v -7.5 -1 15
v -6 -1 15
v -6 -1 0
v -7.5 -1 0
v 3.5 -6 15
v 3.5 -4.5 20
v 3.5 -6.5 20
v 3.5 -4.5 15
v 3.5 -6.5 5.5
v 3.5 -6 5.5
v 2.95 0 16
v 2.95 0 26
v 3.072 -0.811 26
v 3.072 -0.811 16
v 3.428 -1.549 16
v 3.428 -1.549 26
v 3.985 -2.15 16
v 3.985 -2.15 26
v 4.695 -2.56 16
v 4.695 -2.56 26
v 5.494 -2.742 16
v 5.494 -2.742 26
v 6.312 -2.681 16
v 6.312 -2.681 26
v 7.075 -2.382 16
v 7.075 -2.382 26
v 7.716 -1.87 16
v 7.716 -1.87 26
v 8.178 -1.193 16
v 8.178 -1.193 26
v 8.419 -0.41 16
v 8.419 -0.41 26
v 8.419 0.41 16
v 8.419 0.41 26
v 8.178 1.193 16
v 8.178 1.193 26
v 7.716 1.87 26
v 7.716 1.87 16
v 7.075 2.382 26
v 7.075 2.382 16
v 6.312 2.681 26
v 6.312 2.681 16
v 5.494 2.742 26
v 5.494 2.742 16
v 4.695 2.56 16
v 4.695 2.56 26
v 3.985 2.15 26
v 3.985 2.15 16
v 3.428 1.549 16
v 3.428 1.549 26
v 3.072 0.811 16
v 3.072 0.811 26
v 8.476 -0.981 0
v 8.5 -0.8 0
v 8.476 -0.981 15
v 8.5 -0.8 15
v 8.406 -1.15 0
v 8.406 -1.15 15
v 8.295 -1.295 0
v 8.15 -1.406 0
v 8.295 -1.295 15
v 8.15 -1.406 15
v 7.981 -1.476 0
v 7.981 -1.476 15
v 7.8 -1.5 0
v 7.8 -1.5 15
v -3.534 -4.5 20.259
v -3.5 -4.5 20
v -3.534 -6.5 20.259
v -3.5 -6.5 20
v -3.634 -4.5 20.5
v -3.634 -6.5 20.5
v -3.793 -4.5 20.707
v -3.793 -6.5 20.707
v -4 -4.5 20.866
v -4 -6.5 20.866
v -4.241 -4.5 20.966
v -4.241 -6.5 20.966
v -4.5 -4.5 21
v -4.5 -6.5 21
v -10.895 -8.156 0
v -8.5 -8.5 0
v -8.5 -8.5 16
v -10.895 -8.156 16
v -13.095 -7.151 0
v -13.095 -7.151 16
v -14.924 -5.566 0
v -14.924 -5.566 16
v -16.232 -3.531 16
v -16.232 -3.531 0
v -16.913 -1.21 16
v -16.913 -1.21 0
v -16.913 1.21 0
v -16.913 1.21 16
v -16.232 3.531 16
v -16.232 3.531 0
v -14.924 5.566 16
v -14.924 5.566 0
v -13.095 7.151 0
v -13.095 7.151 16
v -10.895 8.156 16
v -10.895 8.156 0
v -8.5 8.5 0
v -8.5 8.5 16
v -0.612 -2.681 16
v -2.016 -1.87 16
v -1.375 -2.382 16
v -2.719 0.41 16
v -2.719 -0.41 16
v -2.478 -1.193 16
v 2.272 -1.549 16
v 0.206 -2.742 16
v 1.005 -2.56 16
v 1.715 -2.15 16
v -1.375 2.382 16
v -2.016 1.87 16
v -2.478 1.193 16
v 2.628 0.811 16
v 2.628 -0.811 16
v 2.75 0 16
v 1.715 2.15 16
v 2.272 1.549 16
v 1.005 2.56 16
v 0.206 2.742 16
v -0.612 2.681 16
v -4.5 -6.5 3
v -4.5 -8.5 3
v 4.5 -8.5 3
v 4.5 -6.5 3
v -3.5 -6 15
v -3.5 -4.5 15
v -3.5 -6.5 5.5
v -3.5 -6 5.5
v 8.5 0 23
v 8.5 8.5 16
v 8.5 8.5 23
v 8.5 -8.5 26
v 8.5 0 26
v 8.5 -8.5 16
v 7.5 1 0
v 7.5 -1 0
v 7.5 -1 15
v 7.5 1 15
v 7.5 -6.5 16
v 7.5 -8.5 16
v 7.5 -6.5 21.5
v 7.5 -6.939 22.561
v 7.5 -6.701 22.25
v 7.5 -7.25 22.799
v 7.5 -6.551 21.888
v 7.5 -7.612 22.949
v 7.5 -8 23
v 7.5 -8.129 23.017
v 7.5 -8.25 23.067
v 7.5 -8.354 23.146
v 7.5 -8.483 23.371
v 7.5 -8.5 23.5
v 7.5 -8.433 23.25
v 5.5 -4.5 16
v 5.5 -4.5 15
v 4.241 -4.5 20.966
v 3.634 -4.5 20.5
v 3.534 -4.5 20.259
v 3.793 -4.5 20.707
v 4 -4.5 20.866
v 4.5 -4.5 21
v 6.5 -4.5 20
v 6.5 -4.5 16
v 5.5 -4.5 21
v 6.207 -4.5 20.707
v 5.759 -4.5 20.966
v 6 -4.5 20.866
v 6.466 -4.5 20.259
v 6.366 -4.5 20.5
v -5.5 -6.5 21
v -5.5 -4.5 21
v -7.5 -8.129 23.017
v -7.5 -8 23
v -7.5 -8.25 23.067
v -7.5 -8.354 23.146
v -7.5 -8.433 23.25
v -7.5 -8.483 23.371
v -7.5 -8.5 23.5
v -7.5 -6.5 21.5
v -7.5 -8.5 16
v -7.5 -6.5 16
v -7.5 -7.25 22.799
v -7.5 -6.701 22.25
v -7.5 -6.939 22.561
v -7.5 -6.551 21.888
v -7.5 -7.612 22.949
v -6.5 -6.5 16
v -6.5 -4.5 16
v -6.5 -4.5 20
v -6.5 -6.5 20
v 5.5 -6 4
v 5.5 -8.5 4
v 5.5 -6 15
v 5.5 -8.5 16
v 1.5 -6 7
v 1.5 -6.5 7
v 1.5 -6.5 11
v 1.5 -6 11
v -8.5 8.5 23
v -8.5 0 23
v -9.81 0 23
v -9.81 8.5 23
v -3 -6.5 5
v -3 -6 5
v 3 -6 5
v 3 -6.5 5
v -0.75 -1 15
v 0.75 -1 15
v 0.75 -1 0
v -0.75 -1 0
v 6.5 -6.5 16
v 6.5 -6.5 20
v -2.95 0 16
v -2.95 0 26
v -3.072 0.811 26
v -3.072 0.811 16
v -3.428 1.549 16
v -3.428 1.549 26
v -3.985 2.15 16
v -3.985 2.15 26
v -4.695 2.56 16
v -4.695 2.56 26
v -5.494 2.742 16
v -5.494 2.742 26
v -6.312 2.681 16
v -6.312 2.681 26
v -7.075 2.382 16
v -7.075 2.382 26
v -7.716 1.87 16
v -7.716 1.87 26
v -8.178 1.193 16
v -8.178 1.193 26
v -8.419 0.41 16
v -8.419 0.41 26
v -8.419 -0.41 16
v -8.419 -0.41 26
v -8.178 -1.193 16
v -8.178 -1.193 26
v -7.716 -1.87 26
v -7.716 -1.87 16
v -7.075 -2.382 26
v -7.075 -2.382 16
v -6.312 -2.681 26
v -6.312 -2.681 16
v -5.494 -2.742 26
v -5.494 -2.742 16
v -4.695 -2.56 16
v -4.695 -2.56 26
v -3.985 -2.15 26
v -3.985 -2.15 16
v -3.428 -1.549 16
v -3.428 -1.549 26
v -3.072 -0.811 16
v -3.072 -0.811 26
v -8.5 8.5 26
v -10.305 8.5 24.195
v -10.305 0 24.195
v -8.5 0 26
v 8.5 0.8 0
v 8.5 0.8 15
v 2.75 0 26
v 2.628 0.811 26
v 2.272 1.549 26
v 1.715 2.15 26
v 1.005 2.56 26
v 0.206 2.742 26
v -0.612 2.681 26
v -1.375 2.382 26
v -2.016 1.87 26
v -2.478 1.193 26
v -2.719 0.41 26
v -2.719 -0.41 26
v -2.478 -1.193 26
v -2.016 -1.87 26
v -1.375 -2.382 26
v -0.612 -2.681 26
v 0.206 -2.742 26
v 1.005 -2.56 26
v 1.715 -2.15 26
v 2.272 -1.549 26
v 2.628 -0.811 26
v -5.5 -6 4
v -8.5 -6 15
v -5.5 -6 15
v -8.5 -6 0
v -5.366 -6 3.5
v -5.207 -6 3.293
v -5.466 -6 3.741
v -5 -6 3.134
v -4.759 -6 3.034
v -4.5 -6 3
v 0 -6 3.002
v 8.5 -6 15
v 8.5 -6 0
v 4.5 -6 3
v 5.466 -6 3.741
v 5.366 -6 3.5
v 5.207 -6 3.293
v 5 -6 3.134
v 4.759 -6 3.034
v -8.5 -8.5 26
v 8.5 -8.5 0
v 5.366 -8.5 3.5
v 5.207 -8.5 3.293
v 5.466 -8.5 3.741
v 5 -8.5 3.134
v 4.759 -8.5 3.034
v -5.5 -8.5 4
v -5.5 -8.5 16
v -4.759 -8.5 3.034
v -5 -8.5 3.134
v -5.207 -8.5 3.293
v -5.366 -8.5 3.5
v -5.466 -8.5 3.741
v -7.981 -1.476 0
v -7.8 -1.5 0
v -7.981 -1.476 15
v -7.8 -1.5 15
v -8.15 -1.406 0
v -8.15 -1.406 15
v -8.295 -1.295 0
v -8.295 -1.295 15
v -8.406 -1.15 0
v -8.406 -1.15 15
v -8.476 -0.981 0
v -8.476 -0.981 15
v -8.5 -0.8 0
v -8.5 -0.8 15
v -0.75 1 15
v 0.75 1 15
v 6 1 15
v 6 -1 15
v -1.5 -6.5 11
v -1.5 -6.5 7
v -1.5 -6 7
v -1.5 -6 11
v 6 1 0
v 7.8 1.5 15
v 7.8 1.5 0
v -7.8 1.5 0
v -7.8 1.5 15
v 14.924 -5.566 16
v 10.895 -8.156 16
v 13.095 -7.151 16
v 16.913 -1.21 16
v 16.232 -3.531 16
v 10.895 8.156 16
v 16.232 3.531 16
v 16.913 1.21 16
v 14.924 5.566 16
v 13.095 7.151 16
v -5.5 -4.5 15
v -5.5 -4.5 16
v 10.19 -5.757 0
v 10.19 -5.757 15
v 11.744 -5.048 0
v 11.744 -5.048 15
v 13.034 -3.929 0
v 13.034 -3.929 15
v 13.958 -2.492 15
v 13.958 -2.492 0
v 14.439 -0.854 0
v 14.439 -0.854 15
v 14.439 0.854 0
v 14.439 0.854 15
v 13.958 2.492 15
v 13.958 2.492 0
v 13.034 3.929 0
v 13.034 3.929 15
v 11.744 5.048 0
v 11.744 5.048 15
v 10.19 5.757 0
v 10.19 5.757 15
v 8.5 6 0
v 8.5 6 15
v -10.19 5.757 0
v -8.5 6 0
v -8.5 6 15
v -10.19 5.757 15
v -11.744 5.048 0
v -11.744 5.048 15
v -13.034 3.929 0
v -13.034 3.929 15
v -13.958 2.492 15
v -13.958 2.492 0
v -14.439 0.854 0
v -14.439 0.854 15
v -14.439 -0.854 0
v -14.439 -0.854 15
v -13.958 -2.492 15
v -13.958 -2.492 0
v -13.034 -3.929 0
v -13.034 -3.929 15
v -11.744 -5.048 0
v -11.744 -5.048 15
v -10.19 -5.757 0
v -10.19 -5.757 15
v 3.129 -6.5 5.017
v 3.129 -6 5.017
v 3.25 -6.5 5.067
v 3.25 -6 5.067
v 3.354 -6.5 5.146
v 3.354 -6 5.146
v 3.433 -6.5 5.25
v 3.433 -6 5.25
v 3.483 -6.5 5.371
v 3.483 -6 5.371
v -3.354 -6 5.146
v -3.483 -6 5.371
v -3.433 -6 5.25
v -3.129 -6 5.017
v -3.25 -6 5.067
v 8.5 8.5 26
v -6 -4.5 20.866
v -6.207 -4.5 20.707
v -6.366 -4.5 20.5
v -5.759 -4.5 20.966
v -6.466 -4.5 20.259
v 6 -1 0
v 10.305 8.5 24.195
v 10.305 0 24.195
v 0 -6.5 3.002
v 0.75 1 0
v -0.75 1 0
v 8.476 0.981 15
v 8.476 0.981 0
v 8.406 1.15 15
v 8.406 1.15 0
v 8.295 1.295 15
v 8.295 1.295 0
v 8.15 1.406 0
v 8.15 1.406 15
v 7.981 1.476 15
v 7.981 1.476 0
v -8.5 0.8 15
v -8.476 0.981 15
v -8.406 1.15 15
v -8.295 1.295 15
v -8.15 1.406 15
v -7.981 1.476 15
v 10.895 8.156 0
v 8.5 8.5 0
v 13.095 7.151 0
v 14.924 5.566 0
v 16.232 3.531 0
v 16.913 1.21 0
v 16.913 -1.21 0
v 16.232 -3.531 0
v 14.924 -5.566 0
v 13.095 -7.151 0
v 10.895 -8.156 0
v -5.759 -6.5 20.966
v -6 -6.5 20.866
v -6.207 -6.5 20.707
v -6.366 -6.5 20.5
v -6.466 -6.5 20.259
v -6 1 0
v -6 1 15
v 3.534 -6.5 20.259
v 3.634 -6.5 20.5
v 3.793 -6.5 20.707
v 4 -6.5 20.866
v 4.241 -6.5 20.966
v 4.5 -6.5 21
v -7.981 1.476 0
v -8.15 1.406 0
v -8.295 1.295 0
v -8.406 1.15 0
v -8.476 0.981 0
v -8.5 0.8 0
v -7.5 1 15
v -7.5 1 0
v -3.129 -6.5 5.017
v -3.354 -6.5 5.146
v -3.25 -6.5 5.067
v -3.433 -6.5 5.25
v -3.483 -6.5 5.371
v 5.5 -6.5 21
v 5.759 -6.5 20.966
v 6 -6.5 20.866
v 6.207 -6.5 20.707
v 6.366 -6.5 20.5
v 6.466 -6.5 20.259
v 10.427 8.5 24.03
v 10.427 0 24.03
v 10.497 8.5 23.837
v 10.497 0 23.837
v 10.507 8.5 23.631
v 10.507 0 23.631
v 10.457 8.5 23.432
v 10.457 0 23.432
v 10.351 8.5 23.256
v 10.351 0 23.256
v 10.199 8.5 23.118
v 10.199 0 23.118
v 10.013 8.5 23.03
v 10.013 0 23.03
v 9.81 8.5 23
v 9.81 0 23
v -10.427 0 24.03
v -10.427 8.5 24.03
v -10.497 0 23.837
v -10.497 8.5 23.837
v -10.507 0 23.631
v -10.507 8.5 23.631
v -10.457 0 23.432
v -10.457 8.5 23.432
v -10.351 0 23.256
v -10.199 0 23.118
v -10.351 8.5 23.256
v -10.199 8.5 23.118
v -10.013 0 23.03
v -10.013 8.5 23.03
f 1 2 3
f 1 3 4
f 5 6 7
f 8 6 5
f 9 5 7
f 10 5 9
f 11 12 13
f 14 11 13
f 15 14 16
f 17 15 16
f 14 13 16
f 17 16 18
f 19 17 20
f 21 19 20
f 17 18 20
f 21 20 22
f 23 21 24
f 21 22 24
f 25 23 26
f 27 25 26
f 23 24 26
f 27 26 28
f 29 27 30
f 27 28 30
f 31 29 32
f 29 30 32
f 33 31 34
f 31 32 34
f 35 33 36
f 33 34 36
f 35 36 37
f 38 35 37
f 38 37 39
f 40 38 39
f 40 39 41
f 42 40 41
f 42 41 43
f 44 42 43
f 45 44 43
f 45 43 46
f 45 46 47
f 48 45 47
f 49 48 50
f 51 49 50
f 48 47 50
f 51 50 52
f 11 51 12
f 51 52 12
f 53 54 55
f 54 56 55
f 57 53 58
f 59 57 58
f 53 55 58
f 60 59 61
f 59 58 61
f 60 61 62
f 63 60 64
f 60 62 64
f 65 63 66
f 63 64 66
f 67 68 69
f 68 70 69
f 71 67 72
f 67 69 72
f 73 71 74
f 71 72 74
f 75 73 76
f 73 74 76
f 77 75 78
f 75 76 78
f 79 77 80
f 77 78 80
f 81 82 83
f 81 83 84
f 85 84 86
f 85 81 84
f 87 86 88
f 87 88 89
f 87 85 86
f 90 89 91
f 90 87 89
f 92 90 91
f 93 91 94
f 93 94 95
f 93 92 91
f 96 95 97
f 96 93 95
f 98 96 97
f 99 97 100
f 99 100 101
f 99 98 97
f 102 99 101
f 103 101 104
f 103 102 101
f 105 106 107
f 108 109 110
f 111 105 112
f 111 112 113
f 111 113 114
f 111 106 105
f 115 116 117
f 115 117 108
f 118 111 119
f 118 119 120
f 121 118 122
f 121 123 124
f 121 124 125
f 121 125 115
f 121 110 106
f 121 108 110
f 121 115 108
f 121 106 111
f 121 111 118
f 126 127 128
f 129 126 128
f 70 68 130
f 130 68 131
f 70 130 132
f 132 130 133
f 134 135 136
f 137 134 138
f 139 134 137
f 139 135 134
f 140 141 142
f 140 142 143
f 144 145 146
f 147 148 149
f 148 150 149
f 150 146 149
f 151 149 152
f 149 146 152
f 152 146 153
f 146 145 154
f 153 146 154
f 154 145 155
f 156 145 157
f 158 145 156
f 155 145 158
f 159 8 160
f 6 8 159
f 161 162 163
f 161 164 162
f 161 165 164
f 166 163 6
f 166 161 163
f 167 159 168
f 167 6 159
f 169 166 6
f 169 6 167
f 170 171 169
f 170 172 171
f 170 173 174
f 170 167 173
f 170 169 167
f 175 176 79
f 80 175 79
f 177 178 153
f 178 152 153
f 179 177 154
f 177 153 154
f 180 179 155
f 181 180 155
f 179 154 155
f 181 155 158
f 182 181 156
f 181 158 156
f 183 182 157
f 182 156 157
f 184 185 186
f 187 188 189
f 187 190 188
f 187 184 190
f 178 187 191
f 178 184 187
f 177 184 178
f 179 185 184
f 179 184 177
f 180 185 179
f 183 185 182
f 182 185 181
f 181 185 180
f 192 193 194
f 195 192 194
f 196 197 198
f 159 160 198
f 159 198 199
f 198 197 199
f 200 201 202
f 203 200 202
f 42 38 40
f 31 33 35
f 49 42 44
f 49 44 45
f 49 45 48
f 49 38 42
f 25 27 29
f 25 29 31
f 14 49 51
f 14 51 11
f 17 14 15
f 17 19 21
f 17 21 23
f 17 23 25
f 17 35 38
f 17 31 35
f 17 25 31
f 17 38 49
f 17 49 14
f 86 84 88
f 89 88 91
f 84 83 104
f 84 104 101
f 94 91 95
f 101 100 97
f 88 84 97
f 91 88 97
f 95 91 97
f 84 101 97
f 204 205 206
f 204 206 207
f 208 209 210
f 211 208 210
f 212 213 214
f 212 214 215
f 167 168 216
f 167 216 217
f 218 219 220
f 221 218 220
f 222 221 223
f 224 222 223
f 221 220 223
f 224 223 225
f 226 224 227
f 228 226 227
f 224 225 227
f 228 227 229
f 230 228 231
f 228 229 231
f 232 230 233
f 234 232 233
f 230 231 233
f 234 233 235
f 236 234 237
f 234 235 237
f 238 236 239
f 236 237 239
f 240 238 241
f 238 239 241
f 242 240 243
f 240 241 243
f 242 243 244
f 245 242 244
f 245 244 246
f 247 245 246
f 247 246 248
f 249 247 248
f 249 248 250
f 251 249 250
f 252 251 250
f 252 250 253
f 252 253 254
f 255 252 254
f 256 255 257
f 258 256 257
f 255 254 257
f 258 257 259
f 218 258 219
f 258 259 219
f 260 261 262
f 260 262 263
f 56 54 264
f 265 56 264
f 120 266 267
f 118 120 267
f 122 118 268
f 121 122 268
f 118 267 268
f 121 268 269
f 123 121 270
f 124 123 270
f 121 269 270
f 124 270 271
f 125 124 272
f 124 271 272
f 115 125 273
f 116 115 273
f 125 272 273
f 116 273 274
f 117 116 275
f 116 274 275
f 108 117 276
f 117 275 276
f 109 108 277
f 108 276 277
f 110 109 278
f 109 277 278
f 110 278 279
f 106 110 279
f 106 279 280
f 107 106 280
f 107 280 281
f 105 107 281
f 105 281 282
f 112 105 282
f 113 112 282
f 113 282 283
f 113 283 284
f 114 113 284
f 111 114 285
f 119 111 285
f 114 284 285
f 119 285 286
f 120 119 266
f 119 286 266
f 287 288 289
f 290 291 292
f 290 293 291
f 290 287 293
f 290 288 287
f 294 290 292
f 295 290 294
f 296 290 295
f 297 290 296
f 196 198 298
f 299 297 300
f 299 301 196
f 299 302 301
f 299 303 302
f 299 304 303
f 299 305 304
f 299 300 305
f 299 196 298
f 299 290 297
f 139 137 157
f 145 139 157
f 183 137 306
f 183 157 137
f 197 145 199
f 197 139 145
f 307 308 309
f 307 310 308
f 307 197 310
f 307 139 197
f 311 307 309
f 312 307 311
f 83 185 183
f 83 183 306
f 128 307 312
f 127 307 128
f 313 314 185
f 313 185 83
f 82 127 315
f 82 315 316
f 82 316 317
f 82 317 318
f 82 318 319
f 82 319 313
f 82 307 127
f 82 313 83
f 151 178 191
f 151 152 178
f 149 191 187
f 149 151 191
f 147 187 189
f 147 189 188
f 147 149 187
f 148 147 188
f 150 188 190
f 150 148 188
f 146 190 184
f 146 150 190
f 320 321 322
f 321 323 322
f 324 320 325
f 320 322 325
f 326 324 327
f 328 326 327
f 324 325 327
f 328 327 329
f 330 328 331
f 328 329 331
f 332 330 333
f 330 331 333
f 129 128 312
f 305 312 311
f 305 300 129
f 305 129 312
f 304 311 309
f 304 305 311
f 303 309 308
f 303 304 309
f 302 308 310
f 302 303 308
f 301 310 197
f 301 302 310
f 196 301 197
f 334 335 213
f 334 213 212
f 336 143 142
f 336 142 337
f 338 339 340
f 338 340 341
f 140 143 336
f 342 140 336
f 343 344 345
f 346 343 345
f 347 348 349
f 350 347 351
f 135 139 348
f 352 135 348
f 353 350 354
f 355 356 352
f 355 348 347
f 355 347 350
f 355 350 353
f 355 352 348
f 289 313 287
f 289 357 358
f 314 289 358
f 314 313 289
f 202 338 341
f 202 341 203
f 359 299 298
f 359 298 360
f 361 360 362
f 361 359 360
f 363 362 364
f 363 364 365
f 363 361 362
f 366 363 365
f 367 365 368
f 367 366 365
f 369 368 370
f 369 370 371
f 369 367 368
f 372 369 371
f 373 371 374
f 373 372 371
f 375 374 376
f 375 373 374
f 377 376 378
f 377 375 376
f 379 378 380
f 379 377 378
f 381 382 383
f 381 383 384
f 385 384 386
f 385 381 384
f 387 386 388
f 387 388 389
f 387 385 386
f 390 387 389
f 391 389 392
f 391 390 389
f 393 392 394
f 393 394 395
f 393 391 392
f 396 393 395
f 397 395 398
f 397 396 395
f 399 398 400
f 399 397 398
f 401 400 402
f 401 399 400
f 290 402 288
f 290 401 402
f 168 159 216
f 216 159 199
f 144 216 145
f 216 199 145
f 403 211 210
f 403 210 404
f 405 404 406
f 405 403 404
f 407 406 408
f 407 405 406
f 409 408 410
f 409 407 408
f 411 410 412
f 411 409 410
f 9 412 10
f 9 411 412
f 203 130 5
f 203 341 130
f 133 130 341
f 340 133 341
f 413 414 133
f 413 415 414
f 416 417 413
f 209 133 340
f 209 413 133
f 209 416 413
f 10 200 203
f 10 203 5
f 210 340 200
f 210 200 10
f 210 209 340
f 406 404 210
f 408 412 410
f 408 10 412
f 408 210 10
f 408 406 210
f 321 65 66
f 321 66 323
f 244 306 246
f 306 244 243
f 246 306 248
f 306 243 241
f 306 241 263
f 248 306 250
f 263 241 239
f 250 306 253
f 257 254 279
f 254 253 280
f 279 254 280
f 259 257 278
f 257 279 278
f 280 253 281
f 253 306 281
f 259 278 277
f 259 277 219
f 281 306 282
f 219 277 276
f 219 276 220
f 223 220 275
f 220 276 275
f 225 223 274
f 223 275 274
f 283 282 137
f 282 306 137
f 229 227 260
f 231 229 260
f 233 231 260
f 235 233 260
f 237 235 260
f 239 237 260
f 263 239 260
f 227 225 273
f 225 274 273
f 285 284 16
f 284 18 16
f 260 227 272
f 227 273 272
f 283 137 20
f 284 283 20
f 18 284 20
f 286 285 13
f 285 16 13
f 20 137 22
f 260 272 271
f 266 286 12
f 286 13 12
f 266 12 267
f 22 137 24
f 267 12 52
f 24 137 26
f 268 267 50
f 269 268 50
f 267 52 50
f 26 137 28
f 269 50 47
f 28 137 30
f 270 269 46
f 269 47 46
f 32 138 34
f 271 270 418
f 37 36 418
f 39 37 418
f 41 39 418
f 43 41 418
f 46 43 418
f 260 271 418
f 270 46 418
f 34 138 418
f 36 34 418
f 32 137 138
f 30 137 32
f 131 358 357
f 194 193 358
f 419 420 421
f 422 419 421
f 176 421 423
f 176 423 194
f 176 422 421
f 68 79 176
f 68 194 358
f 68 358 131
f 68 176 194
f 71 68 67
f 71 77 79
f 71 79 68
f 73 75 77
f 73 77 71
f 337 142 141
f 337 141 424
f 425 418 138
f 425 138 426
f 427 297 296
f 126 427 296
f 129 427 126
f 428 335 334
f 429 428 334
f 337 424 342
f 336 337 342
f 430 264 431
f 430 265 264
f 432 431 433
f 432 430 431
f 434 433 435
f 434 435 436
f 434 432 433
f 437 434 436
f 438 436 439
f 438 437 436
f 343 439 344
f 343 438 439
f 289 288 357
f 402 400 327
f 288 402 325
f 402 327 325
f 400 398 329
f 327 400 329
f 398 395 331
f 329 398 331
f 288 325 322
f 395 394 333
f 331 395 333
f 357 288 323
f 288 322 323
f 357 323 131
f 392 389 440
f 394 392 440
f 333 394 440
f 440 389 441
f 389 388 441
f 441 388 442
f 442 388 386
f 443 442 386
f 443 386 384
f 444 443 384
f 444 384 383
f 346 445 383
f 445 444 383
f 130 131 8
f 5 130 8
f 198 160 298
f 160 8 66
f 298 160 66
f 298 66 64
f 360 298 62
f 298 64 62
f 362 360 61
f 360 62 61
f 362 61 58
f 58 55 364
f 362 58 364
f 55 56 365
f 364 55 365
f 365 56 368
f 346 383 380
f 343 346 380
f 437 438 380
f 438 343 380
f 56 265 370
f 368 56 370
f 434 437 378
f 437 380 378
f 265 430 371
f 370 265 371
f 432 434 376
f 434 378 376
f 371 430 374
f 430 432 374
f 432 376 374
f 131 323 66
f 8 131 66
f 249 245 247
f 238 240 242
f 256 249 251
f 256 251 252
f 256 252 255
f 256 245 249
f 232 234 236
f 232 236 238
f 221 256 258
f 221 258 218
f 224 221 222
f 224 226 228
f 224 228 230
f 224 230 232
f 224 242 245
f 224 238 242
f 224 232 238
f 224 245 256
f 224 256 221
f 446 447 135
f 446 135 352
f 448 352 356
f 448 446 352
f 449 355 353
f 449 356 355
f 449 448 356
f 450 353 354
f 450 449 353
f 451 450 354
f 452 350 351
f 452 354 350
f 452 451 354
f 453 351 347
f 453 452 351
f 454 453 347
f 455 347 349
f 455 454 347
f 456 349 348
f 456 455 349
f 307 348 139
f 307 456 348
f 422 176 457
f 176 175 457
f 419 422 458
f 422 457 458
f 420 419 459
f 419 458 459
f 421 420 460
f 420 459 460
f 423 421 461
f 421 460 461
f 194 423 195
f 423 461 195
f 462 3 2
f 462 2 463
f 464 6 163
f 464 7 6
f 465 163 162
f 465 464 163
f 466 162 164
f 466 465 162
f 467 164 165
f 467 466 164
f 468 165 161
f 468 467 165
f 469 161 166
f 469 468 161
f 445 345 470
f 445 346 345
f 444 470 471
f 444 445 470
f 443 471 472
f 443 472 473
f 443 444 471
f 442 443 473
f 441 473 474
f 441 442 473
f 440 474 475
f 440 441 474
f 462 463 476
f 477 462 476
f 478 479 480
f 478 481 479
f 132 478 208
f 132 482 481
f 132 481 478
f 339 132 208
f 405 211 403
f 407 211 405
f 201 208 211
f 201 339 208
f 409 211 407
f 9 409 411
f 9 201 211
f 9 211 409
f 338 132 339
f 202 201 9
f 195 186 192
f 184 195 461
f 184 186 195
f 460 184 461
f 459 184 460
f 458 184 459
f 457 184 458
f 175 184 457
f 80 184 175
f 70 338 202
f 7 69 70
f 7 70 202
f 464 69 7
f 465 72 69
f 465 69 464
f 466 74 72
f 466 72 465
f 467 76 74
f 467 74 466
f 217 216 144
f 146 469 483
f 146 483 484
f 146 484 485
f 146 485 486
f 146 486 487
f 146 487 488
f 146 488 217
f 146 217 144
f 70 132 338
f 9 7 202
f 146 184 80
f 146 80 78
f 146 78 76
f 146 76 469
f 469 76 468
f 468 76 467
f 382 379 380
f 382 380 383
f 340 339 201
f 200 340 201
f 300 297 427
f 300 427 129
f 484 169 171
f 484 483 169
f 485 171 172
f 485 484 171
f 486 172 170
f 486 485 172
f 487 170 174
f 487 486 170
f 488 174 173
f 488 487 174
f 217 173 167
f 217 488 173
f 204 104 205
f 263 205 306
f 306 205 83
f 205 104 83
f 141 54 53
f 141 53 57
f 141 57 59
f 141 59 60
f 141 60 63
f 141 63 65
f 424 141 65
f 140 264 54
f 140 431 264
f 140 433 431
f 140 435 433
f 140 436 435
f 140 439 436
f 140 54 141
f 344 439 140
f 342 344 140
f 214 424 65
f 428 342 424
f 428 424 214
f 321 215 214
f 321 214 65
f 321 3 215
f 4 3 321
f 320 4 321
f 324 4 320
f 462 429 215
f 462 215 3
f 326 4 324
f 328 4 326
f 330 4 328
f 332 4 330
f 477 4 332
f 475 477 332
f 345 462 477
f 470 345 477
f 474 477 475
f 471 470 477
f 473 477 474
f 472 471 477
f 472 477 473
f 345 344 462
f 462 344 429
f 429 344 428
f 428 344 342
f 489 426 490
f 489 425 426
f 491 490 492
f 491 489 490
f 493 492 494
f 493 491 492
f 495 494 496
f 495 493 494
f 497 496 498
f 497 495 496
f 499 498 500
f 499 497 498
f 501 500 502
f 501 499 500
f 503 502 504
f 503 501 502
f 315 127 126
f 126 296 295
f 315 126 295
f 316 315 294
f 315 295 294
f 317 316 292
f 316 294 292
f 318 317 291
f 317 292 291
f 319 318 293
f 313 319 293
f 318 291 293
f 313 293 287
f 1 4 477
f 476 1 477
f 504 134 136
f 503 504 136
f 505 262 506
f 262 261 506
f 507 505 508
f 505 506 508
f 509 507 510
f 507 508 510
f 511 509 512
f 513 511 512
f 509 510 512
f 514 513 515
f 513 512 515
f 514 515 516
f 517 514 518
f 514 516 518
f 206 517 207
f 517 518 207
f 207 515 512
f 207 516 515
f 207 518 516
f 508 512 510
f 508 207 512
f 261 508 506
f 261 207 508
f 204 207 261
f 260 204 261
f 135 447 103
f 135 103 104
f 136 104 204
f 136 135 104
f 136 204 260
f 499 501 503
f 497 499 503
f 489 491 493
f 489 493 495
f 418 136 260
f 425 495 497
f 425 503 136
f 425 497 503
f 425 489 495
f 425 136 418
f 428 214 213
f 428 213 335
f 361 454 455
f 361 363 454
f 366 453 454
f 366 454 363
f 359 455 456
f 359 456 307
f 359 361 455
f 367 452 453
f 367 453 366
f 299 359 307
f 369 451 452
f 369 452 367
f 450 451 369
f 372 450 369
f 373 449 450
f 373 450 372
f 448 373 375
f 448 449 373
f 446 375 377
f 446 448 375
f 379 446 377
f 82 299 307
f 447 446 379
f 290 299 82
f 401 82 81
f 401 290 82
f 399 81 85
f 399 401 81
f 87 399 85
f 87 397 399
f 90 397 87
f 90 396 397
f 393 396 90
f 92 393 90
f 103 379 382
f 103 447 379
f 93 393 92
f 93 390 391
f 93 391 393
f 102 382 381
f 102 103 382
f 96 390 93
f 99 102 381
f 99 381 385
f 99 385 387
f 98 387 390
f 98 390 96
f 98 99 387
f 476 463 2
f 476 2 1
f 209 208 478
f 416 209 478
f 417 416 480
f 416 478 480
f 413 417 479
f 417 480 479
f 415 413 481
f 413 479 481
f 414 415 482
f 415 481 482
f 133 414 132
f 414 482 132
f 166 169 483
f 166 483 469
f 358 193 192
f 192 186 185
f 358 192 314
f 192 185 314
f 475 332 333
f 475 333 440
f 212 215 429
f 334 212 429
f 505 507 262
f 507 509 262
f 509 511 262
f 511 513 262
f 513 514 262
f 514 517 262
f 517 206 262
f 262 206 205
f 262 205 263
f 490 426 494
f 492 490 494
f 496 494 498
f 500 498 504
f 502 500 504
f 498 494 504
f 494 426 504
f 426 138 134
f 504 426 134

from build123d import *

# Parameters (mm, degrees)
EXTRUDE_1_DEPTH      = 26
CUT_EXTRUDE_START    = -10
CUT_EXTRUDE_1_DEPTH  = 10
SKETCH_3_W           = 3
SKETCH_3_H           = 8.5
EXTRUDE_2_DEPTH      = 3
CUT_EXTRUDE_2_REACH  = 37.412
SKETCH_5_W           = 3
SKETCH_5_H           = 8.5
EXTRUDE_3_DEPTH      = 3
CUT_EXTRUDE_3_REACH  = 37.412
SKETCH_7_W           = 11
SKETCH_7_H           = 20
CUT_EXTRUDE_4_DEPTH  = 2
FILLET_3_R           = 1
FILLET_4_R           = 1
SKETCH_10_W          = 15
SKETCH_10_H          = 7
CUT_EXTRUDE_5_DEPTH  = 2
CUT_EXTRUDE_START_2  = -4
CUT_EXTRUDE_6_DEPTH  = 4
FILLET_5_R           = 0.5
FILLET_6_R           = 0.5
FILLET_7_R           = 1
FILLET_9_R           = 0.7
FILLET_10_R          = 0.7
SKETCH_12_W          = 3
SKETCH_12_H          = 4
CUT_EXTRUDE_7_DEPTH  = 4
FILLET_11_R          = 1.5
FILLET_12_R          = 0.5
SKETCH_13_R          = 2.75
CUT_EXTRUDE_16_DEPTH = 10
SKETCH_14_W          = 17
SKETCH_14_H          = 3
CUT_EXTRUDE_20_DEPTH = 15
FILLET_13_R          = 0.7
SKETCH_15_W          = 1.5
SKETCH_15_H          = 2
CUT_EXTRUDE_22_DEPTH = 15


with BuildPart() as part:
    # ｽｹｯﾁ1 → ﾎﾞｽ - 押し出し1 (new body)
    with BuildSketch(Plane.XY):
        with BuildLine():
            Line((8.5, -8.5), (-8.5, -8.5))
            ThreePointArc((-8.5, -8.5), (-17, 0), (-8.5, 8.5))
            Line((-8.5, 8.5), (8.5, 8.5))
            ThreePointArc((8.5, 8.5), (17, 0), (8.5, -8.5))
        make_face()
    extrude(amount=EXTRUDE_1_DEPTH)

    # ｽｹｯﾁ2 → ｶｯﾄ - 押し出し1 (cut)
    with BuildSketch(Plane.XY.offset(26).offset(CUT_EXTRUDE_START)):
        with BuildLine():
            Line((-8.5, 8.5), (-8.5, -8.5))
            ThreePointArc((-8.5, -8.5), (-17, 0), (-8.5, 8.5))
        make_face()
        with BuildLine():
            Line((8.5, 8.5), (8.5, -8.5))
            ThreePointArc((8.5, -8.5), (17, 0), (8.5, 8.5))
        make_face()
    extrude(amount=CUT_EXTRUDE_1_DEPTH, mode=Mode.SUBTRACT)

    # ｽｹｯﾁ3 → ﾎﾞｽ - 押し出し2 (add)
    with BuildSketch(Plane(origin=(8.5, 0, 0), x_dir=(0, 0, -1), z_dir=(1, 0, 0))):
        with Locations((-24.5, 4.25)):
            Rectangle(SKETCH_3_W, SKETCH_3_H)
    extrude(amount=EXTRUDE_2_DEPTH)

    # ｽｹｯﾁ4 → ｶｯﾄ - 押し出し2 (cut, up to next)
    with BuildSketch(Plane(origin=(0, 8.5, 0), x_dir=(1, 0, 0), z_dir=(0, 1, 0)), mode=Mode.PRIVATE) as cut_extrude_2_sk1:
        Polygon((11.5, -23), (11.5, -26), (8.5, -26), align=None)
    cut_extrude_2_tool1 = extrude(cut_extrude_2_sk1.sketch, amount=-CUT_EXTRUDE_2_REACH, mode=Mode.PRIVATE) & part.part
    add(cut_extrude_2_tool1.solids().sort_by_distance((10.5, 8.5, 25))[0], mode=Mode.SUBTRACT)

    # ｽｹｯﾁ5 → ﾎﾞｽ - 押し出し3 (add)
    with BuildSketch(Plane.ZY.offset(8.5)):
        with Locations((24.5, 4.25)):
            Rectangle(SKETCH_5_W, SKETCH_5_H)
    extrude(amount=EXTRUDE_3_DEPTH)

    # ｽｹｯﾁ6 → ｶｯﾄ - 押し出し3 (cut, up to next)
    with BuildSketch(Plane(origin=(0, 8.5, 0), x_dir=(1, 0, 0), z_dir=(0, 1, 0)), mode=Mode.PRIVATE) as cut_extrude_3_sk1:
        Polygon((-11.5, -26), (-11.5, -23), (-8.5, -26), align=None)
    cut_extrude_3_tool1 = extrude(cut_extrude_3_sk1.sketch, amount=-CUT_EXTRUDE_3_REACH, mode=Mode.PRIVATE) & part.part
    add(cut_extrude_3_tool1.solids().sort_by_distance((-10.5, 8.5, 25))[0], mode=Mode.SUBTRACT)

    # ｽｹｯﾁ7 → ｶｯﾄ - 押し出し4 (cut)
    with BuildSketch(Plane.XZ.offset(8.5)):
        with Locations((0, 13)):
            Rectangle(SKETCH_7_W, SKETCH_7_H)
    extrude(amount=-CUT_EXTRUDE_4_DEPTH, mode=Mode.SUBTRACT)

    # ﾌｨﾚｯﾄ3
    fillet_3_edges = [part.edges().sort_by_distance(p)[0] for p in [
        (5.5, -7.5, 3),
    ]]
    fillet(fillet_3_edges, radius=FILLET_3_R)

    # ﾌｨﾚｯﾄ4
    fillet_4_edges = [part.edges().sort_by_distance(p)[0] for p in [
        (-5.5, -7.5, 3),
    ]]
    fillet(fillet_4_edges, radius=FILLET_4_R)

    # ｽｹｯﾁ10 → ｶｯﾄ - 押し出し5 (cut)
    with BuildSketch(Plane.XZ.offset(8.5)):
        with Locations((0, 19.5)):
            Rectangle(SKETCH_10_W, SKETCH_10_H)
    extrude(amount=-CUT_EXTRUDE_5_DEPTH, mode=Mode.SUBTRACT)

    # ｽｹｯﾁ11 → ｶｯﾄ - 押し出し6 (cut)
    with BuildSketch(Plane.XZ.offset(8.5).offset(CUT_EXTRUDE_START_2)):
        with BuildLine():
            Line((6.5, 21), (3.5, 21))
            Line((3.5, 21), (3.5, 5))
            Line((3.5, 5), (0, 5))
            Line((0, 5), (0, 3.001563835))
            Line((0, 3.001563835), (4.5, 3))
            ThreePointArc((4.5, 3), (5.207106781, 3.292893219), (5.5, 4))
            Line((5.5, 4), (5.5, 16))
            Line((5.5, 16), (6.5, 16))
            Line((6.5, 16), (6.5, 21))
        make_face()
    cut_extrude_6 = extrude(amount=CUT_EXTRUDE_6_DEPTH, mode=Mode.SUBTRACT)

    # ﾐﾗｰ1: ｶｯﾄ - 押し出し6 across plane
    add(cut_extrude_6.mirror(Plane(origin=(0, 0, 0), x_dir=(0, 0, 1), z_dir=(1, 0, 0))), mode=Mode.SUBTRACT)

    # ﾌｨﾚｯﾄ5
    fillet_5_edges = [part.edges().sort_by_distance(p)[0] for p in [
        (3.5, -5.5, 5),
    ]]
    fillet(fillet_5_edges, radius=FILLET_5_R)

    # ﾌｨﾚｯﾄ6
    fillet_6_edges = [part.edges().sort_by_distance(p)[0] for p in [
        (-3.5, -5.5, 5),
    ]]
    fillet(fillet_6_edges, radius=FILLET_6_R)

    # ﾌｨﾚｯﾄ7
    fillet_7_edges = [part.edges().sort_by_distance(p)[0] for p in [
        (3.5, -5.5, 21),
        (6.5, -5.5, 21),
        (-6.5, -5.5, 21),
        (-3.5, -5.5, 21),
    ]]
    fillet(fillet_7_edges, radius=FILLET_7_R)

    # ﾌｨﾚｯﾄ9
    fillet_9_edges = [part.edges().sort_by_distance(p)[0] for p in [
        (-11.5, 4.25, 23),
    ]]
    fillet(fillet_9_edges, radius=FILLET_9_R)

    # ﾌｨﾚｯﾄ10
    fillet_10_edges = [part.edges().sort_by_distance(p)[0] for p in [
        (11.5, 4.25, 23),
    ]]
    fillet(fillet_10_edges, radius=FILLET_10_R)

    # ｽｹｯﾁ12 → ｶｯﾄ - 押し出し7 (cut)
    with BuildSketch(Plane.XZ.offset(8.5)):
        with Locations((0, 9)):
            Rectangle(SKETCH_12_W, SKETCH_12_H)
    extrude(amount=-CUT_EXTRUDE_7_DEPTH, mode=Mode.SUBTRACT)

    # ﾌｨﾚｯﾄ11
    fillet_11_edges = [part.edges().sort_by_distance(p)[0] for p in [
        (0, -6.5, 23),
    ]]
    fillet(fillet_11_edges, radius=FILLET_11_R)

    # ﾌｨﾚｯﾄ12
    fillet_12_edges = [part.edges().sort_by_distance(p)[0] for p in [
        (0, -8.5, 23),
    ]]
    fillet(fillet_12_edges, radius=FILLET_12_R - 0.0001)  # a hair under: the kernel refuses the full size

    # ｽｹｯﾁ13 → ｶｯﾄ - 押し出し16 (cut)
    with BuildSketch(Plane.XY.offset(26)):
        Circle(SKETCH_13_R)
        with Locations((-5.7, 0)):
            Circle(SKETCH_13_R)
        with Locations(Location((5.7, 0, 0), (0, 0, 180))):
            Circle(SKETCH_13_R)
    extrude(amount=-CUT_EXTRUDE_16_DEPTH, mode=Mode.SUBTRACT)

    # ｽｹｯﾁ14 → ｶｯﾄ - 押し出し20 (cut)
    with BuildSketch(Plane(origin=(0, 0, 0), x_dir=(-1, 0, 0), z_dir=(0, 0, -1))):
        with BuildLine():
            Line((8.5, -6), (-8.5, -6))
            ThreePointArc((-8.5, -6), (-14.5, 0), (-8.5, 6))
            Line((-8.5, 6), (8.5, 6))
            ThreePointArc((8.5, 6), (14.5, 0), (8.5, -6))
        make_face()
        Rectangle(SKETCH_14_W, SKETCH_14_H, mode=Mode.SUBTRACT)
    extrude(amount=-CUT_EXTRUDE_20_DEPTH, mode=Mode.SUBTRACT)

    # ﾌｨﾚｯﾄ13
    fillet_13_edges = [part.edges().sort_by_distance(p)[0] for p in [
        (8.5, 1.5, 7.5),
        (-8.5, 1.5, 7.5),
        (-8.5, -1.5, 7.5),
        (8.5, -1.5, 7.5),
    ]]
    fillet(fillet_13_edges, radius=FILLET_13_R)

    # ｽｹｯﾁ15 → ｶｯﾄ - 押し出し22 (cut)
    with BuildSketch(Plane(origin=(0, 0, 0), x_dir=(-1, 0, 0), z_dir=(0, 0, -1))):
        with Locations((-6.75, 0)):
            Rectangle(SKETCH_15_W, SKETCH_15_H)
        with Locations((6.75, 0)):
            Rectangle(SKETCH_15_W, SKETCH_15_H)
        Rectangle(SKETCH_15_W, SKETCH_15_H)
    extrude(amount=-CUT_EXTRUDE_22_DEPTH, mode=Mode.SUBTRACT)


solid = part.part
